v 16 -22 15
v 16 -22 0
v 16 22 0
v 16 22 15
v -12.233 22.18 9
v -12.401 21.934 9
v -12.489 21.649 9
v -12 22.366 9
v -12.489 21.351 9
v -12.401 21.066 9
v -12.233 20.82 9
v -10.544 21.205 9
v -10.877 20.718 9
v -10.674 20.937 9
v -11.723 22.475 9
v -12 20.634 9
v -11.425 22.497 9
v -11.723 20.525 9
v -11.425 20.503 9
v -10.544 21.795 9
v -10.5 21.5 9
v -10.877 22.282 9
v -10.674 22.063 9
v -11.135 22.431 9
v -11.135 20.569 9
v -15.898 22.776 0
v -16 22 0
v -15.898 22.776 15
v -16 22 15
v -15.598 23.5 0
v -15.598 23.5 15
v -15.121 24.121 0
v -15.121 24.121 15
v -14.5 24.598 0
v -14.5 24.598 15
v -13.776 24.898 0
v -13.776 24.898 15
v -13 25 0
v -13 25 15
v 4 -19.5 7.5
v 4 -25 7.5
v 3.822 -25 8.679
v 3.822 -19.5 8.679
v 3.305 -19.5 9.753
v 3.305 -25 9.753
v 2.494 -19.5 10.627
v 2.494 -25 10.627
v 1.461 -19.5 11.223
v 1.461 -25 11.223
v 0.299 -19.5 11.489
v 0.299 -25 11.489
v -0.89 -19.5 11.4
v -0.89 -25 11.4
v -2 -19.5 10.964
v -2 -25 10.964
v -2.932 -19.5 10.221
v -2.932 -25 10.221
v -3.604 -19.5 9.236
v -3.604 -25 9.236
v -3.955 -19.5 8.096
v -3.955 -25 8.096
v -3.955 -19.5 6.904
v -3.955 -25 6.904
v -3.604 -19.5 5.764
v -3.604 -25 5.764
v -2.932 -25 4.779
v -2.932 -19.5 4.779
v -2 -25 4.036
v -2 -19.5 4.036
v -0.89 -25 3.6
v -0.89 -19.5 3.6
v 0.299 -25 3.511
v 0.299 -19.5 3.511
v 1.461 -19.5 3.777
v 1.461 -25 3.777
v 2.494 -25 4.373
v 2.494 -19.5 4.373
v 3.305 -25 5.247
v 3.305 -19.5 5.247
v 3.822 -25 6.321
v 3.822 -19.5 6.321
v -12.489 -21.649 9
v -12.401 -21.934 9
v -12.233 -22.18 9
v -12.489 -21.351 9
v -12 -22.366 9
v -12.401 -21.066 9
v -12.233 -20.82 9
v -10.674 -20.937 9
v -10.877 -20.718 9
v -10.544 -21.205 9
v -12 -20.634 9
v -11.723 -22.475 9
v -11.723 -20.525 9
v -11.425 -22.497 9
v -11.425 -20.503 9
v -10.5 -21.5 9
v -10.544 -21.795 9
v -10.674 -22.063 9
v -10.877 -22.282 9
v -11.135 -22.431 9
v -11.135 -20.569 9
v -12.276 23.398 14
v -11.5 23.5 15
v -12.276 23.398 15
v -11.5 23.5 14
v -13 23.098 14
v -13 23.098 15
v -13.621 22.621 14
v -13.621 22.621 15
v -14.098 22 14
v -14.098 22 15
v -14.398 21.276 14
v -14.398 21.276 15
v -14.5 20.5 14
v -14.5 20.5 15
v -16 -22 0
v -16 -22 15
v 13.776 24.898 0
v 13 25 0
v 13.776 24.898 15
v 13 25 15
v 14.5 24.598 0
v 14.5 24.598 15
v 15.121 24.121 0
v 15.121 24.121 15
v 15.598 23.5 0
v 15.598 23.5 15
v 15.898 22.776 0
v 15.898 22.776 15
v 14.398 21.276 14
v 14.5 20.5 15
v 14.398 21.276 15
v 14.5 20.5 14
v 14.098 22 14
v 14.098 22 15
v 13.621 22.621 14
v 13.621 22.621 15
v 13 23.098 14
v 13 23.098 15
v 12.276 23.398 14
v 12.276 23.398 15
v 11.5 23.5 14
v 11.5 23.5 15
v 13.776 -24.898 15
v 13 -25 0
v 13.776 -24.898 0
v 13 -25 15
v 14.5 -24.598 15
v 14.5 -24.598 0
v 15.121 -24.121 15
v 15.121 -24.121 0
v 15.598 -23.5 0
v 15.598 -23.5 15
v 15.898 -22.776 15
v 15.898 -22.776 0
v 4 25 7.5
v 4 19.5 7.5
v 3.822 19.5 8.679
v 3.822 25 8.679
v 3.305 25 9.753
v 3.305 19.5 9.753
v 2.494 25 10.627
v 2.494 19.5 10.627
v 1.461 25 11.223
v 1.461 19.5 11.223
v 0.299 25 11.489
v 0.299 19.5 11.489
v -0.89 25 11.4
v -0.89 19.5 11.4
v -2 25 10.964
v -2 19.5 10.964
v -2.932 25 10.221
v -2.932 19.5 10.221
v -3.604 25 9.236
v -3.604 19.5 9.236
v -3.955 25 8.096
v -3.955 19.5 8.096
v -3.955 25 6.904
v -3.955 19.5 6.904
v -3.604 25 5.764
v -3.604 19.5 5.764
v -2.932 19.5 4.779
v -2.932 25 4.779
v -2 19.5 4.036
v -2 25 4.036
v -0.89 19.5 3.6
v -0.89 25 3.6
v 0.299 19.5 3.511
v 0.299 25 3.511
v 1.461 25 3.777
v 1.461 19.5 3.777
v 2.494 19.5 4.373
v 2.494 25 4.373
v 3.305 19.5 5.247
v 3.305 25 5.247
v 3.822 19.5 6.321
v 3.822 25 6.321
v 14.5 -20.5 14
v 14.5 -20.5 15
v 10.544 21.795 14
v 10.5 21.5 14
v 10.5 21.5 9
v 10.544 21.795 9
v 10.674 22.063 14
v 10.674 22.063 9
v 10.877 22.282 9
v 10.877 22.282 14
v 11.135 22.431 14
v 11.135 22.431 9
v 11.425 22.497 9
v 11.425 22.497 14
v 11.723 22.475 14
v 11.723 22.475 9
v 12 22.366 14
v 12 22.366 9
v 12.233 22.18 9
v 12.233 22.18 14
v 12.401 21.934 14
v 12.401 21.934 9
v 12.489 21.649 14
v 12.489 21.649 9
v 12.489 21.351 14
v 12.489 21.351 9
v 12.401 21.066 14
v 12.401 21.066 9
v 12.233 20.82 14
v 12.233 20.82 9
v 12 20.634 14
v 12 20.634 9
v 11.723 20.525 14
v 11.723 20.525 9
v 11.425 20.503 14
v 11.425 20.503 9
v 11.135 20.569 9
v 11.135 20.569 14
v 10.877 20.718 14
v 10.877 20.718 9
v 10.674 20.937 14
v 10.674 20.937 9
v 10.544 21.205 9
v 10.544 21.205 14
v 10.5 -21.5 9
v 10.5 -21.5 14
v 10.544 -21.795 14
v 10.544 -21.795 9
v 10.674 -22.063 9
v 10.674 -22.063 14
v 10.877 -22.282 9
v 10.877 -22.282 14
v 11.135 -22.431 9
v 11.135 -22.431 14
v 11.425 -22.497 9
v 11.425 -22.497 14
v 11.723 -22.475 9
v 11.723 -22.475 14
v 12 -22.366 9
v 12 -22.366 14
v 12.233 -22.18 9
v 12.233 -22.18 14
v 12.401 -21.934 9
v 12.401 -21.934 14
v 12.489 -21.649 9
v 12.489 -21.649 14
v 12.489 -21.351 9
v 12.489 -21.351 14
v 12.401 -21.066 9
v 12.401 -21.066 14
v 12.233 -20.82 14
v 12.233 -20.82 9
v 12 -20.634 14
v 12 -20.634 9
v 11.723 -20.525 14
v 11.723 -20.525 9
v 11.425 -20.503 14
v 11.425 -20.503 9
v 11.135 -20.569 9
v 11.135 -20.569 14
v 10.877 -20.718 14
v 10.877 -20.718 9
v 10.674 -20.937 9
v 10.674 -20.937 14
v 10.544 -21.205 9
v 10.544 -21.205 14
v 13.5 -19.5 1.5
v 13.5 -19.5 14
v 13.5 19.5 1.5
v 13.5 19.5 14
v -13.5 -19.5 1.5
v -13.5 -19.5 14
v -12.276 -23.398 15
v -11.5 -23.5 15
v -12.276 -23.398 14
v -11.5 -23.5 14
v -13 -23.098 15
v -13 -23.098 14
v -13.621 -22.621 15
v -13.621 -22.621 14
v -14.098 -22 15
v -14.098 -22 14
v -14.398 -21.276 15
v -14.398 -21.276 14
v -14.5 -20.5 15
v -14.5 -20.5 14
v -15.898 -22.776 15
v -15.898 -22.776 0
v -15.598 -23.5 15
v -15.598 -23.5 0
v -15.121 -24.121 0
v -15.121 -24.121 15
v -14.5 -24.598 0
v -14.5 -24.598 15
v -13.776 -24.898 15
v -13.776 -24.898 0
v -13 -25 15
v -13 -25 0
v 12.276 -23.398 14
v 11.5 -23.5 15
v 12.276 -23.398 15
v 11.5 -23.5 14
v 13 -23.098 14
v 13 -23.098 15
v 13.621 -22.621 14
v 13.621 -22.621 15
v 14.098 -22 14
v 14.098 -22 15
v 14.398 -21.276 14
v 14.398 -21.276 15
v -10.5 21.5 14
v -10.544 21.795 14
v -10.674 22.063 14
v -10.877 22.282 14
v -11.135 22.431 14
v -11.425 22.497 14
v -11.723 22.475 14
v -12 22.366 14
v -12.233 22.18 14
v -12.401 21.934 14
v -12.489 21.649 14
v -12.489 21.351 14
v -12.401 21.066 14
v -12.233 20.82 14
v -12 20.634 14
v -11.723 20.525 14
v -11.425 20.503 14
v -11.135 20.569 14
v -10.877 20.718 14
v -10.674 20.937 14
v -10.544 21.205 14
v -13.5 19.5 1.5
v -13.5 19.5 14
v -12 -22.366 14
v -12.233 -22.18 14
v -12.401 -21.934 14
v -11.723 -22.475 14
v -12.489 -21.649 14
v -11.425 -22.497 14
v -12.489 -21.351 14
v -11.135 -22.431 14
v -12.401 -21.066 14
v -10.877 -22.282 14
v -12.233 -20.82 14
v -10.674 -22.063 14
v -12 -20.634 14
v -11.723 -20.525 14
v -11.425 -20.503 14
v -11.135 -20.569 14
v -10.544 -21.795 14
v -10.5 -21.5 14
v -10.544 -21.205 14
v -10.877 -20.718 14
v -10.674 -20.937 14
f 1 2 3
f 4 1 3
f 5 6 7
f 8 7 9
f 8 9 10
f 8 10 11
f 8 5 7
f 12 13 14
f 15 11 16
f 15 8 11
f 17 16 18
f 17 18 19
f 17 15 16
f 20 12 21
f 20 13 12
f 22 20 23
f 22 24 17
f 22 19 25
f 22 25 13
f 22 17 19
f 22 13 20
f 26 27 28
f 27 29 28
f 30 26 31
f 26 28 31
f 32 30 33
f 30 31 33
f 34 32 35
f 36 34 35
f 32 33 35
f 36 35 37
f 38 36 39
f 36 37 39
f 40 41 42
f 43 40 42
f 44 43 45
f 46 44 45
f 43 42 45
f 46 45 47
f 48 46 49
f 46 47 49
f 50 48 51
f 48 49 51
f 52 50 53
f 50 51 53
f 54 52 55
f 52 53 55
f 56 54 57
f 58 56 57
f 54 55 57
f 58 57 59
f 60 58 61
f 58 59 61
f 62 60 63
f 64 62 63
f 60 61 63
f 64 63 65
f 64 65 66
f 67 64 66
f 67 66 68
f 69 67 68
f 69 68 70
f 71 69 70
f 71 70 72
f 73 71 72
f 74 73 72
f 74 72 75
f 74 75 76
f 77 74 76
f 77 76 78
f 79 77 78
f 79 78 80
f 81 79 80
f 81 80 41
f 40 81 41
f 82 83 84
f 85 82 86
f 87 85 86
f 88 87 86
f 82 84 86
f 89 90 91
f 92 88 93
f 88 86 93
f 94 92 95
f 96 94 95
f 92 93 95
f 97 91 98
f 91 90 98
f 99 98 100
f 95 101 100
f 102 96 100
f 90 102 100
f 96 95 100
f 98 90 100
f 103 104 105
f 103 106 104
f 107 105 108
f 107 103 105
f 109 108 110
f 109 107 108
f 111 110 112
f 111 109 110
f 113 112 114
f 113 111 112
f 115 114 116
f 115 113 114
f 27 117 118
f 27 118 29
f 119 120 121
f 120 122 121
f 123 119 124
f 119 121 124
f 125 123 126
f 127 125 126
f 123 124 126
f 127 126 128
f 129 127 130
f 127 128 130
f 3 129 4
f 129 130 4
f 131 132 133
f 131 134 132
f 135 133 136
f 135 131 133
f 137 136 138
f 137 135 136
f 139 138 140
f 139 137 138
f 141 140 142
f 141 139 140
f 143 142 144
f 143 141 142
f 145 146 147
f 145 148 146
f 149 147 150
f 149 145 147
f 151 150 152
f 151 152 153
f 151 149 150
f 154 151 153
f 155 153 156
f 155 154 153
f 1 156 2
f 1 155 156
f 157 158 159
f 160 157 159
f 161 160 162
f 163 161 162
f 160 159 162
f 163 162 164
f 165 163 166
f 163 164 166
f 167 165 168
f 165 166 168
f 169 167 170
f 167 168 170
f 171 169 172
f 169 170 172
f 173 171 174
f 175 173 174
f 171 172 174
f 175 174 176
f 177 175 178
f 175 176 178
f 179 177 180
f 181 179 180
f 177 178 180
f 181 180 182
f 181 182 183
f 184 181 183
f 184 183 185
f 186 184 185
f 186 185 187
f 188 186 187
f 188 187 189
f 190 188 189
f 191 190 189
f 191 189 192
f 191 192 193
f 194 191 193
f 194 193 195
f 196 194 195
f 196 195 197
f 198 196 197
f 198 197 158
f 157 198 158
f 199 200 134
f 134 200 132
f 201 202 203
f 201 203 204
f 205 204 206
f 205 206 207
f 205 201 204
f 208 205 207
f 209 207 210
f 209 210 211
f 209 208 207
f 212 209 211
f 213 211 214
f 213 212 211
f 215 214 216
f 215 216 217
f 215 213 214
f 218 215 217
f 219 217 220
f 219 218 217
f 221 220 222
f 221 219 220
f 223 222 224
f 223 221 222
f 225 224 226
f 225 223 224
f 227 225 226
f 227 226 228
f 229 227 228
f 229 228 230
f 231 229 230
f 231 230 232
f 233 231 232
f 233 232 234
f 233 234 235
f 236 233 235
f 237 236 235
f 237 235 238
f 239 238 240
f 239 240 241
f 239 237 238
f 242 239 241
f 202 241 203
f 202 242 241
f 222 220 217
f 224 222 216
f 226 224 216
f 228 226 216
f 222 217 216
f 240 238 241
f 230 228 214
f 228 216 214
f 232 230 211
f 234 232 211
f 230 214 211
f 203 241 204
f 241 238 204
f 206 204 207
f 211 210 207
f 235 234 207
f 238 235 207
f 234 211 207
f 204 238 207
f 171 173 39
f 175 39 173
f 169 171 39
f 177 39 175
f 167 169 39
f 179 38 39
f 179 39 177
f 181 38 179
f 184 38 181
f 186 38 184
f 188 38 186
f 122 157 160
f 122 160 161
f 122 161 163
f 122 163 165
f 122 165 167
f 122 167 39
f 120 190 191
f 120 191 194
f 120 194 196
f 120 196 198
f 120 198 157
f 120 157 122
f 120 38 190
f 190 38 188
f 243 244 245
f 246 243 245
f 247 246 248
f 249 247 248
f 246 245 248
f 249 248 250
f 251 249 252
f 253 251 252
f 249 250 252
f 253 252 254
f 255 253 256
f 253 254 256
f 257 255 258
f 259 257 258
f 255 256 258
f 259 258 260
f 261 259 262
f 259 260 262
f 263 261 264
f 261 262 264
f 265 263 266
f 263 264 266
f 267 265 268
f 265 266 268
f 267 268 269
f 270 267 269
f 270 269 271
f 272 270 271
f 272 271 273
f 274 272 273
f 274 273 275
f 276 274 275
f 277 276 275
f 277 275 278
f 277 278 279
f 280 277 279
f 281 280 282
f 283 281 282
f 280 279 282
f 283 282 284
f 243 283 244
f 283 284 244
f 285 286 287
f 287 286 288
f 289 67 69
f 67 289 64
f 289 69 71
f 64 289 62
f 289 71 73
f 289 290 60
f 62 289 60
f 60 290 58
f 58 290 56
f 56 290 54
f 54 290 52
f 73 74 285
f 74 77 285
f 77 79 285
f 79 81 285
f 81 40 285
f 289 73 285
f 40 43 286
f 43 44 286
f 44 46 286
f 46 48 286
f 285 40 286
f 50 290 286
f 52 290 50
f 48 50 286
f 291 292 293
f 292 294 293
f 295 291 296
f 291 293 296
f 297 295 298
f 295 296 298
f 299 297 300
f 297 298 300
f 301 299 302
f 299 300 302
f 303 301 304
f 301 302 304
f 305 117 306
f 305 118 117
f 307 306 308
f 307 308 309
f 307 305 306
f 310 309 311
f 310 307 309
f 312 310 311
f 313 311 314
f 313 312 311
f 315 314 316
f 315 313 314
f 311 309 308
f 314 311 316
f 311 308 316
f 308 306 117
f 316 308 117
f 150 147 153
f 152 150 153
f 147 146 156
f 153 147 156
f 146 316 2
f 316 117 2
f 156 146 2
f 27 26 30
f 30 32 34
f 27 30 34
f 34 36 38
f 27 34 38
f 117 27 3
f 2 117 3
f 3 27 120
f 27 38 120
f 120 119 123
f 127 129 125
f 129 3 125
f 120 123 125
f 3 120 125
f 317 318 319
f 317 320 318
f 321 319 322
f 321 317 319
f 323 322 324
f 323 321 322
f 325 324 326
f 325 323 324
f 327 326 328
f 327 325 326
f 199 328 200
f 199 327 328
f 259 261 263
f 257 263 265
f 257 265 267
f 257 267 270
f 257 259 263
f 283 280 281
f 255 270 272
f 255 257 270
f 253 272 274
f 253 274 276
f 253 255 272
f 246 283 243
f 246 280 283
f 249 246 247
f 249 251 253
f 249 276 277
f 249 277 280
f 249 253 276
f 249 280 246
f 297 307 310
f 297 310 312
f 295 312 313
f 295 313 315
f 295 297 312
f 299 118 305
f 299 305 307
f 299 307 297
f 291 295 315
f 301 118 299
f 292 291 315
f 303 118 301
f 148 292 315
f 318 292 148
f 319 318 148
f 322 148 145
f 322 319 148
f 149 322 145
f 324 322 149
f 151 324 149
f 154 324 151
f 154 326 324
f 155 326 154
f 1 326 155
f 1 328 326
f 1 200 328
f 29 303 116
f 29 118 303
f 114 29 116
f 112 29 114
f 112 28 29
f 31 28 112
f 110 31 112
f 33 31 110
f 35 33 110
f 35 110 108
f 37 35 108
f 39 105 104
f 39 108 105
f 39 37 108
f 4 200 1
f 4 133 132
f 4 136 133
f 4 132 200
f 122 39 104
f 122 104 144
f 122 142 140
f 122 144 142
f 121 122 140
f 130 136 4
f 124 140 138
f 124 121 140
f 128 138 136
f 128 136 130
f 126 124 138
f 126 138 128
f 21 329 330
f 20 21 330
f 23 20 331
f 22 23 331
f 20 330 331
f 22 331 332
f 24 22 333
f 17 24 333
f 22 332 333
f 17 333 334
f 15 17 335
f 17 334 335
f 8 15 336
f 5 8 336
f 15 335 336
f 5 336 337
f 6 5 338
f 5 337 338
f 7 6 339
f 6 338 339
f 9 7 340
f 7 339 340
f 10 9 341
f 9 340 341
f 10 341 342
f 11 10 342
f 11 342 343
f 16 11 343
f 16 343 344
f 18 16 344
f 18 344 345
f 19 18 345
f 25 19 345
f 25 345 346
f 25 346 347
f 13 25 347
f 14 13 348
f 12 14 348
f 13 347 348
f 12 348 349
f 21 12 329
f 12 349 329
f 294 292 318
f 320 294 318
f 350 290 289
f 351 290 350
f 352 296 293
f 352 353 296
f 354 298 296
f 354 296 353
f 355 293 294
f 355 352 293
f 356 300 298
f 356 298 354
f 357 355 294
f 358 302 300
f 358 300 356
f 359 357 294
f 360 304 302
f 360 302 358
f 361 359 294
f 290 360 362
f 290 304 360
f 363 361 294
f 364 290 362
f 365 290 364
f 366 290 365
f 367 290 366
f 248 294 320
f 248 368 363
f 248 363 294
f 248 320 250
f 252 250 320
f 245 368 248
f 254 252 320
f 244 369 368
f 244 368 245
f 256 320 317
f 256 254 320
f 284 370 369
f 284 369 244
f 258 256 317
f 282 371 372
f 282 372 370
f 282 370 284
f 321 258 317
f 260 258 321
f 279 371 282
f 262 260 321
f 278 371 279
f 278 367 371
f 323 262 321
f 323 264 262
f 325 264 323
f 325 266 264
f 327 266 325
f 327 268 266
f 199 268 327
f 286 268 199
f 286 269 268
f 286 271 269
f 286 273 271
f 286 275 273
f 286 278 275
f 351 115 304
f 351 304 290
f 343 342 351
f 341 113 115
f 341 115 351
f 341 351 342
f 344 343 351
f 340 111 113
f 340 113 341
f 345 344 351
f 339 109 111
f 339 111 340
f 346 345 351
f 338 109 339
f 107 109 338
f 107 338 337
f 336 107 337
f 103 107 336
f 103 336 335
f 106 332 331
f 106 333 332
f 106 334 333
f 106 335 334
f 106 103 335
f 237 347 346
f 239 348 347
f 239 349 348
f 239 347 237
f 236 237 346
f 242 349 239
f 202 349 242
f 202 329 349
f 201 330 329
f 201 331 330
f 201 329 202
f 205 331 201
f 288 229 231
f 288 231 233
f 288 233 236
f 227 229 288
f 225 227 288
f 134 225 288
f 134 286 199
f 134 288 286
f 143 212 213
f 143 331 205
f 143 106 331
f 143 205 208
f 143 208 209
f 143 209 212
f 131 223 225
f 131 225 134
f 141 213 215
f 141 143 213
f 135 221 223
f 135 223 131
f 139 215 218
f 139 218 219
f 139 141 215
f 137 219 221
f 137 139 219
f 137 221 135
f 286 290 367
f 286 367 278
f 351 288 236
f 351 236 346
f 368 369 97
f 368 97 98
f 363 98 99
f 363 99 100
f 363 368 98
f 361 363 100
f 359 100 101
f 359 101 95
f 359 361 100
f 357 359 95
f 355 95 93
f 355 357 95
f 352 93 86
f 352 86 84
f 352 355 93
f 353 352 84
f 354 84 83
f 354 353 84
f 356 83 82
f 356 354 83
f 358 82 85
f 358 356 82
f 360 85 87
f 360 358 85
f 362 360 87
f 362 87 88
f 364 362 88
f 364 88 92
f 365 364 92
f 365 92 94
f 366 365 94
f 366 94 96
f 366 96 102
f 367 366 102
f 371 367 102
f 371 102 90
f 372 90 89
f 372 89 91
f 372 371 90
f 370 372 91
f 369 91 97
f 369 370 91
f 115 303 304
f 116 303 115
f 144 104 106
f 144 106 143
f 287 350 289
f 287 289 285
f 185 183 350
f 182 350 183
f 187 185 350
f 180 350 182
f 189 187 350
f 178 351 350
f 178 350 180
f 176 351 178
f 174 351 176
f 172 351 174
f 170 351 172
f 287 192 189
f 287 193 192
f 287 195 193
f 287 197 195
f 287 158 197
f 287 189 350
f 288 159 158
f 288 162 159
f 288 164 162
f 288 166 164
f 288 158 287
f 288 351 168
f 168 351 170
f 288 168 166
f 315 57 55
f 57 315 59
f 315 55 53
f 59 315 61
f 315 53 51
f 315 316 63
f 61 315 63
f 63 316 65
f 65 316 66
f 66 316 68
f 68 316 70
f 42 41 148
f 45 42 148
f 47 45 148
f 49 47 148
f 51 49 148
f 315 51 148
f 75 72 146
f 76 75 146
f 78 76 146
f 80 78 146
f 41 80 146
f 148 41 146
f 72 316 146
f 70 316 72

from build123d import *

# Parameters (mm, degrees)
SKETCH_W                      = 32
SKETCH_H                      = 50
PAD_DEPTH                     = 15
SKETCH001_W                   = 27
SKETCH001_H                   = 39
POCKET_DEPTH                  = 13.5
FILLET_R                      = 3
SKETCH002_W                   = 29
SKETCH002_H                   = 47
POCKET001_DEPTH               = 1
FILLET001_R                   = 3
SKETCH003_R                   = 4
POCKET002_DEPTH               = 50.001
SKETCH007_R                   = 1
POCKET004_DEPTH               = 5
SKETCH007_MIRRORED002_2_R     = 1
POCKET004_MIRRORED002_2_DEPTH = 5


with BuildPart() as part:
    # Sketch → Pad (new body)
    with BuildSketch(Plane.XY):
        Rectangle(SKETCH_W, SKETCH_H)
    extrude(amount=PAD_DEPTH)

    # Sketch001 (on Face6 of Pad) → Pocket (cut)
    with BuildSketch(Plane.XY.offset(15)):
        Rectangle(SKETCH001_W, SKETCH001_H)
    extrude(amount=-POCKET_DEPTH, mode=Mode.SUBTRACT)

    # Fillet
    fillet_edges = [part.edges().sort_by_distance(p)[0] for p in [
        (-16, -25, 7.5),
        (16, -25, 7.5),
        (-16, 25, 7.5),
        (16, 25, 7.5),
    ]]
    fillet(fillet_edges, radius=FILLET_R)

    # Sketch002 (on Face5 of Fillet) → Pocket001 (cut)
    with BuildSketch(Plane.XY.offset(15)):
        Rectangle(SKETCH002_W, SKETCH002_H)
    extrude(amount=-POCKET001_DEPTH, mode=Mode.SUBTRACT)

    # Fillet001
    fillet001_edges = [part.edges().sort_by_distance(p)[0] for p in [
        (-14.5, 23.5, 14.5),
        (14.5, 23.5, 14.5),
        (-14.5, -23.5, 14.5),
        (14.5, -23.5, 14.5),
    ]]
    fillet(fillet001_edges, radius=FILLET001_R)

    # Sketch003 (on Face17 of Fillet001) → Pocket002 (cut, through all)
    with BuildSketch(Plane.XZ.offset(25)):
        with Locations((0, 7.5)):
            Circle(SKETCH003_R)
    extrude(amount=-POCKET002_DEPTH, mode=Mode.SUBTRACT)

    # Sketch007 (on Face18 of Pocket002) → Pocket004 (cut)
    with BuildSketch(Plane.XY.offset(14)):
        with Locations((-11.5, 21.5)):
            Circle(SKETCH007_R)
    pocket004 = extrude(amount=-POCKET004_DEPTH, mode=Mode.SUBTRACT)

    # Sketch007 Mirrored002 2 → Pocket004 Mirrored002 2 (cut)
    with BuildSketch(Plane(origin=(0, 0, 14), x_dir=(-1, 0, 0), z_dir=(0, 0, -1))):
        with Locations((-11.5, 21.5)):
            Circle(SKETCH007_MIRRORED002_2_R)
    pocket004_mirrored002_2 = extrude(amount=POCKET004_MIRRORED002_2_DEPTH, mode=Mode.SUBTRACT)

    # Mirrored003: Pocket004, Pocket004 Mirrored002 2 across Sketch007 H_Axis
    add(pocket004.mirror(Plane(origin=(0, 0, 14), x_dir=(0, 0, 1), z_dir=(0, 1, 0))), mode=Mode.SUBTRACT)
    add(pocket004_mirrored002_2.mirror(Plane(origin=(0, 0, 14), x_dir=(0, 0, 1), z_dir=(0, 1, 0))), mode=Mode.SUBTRACT)


solid = part.part
